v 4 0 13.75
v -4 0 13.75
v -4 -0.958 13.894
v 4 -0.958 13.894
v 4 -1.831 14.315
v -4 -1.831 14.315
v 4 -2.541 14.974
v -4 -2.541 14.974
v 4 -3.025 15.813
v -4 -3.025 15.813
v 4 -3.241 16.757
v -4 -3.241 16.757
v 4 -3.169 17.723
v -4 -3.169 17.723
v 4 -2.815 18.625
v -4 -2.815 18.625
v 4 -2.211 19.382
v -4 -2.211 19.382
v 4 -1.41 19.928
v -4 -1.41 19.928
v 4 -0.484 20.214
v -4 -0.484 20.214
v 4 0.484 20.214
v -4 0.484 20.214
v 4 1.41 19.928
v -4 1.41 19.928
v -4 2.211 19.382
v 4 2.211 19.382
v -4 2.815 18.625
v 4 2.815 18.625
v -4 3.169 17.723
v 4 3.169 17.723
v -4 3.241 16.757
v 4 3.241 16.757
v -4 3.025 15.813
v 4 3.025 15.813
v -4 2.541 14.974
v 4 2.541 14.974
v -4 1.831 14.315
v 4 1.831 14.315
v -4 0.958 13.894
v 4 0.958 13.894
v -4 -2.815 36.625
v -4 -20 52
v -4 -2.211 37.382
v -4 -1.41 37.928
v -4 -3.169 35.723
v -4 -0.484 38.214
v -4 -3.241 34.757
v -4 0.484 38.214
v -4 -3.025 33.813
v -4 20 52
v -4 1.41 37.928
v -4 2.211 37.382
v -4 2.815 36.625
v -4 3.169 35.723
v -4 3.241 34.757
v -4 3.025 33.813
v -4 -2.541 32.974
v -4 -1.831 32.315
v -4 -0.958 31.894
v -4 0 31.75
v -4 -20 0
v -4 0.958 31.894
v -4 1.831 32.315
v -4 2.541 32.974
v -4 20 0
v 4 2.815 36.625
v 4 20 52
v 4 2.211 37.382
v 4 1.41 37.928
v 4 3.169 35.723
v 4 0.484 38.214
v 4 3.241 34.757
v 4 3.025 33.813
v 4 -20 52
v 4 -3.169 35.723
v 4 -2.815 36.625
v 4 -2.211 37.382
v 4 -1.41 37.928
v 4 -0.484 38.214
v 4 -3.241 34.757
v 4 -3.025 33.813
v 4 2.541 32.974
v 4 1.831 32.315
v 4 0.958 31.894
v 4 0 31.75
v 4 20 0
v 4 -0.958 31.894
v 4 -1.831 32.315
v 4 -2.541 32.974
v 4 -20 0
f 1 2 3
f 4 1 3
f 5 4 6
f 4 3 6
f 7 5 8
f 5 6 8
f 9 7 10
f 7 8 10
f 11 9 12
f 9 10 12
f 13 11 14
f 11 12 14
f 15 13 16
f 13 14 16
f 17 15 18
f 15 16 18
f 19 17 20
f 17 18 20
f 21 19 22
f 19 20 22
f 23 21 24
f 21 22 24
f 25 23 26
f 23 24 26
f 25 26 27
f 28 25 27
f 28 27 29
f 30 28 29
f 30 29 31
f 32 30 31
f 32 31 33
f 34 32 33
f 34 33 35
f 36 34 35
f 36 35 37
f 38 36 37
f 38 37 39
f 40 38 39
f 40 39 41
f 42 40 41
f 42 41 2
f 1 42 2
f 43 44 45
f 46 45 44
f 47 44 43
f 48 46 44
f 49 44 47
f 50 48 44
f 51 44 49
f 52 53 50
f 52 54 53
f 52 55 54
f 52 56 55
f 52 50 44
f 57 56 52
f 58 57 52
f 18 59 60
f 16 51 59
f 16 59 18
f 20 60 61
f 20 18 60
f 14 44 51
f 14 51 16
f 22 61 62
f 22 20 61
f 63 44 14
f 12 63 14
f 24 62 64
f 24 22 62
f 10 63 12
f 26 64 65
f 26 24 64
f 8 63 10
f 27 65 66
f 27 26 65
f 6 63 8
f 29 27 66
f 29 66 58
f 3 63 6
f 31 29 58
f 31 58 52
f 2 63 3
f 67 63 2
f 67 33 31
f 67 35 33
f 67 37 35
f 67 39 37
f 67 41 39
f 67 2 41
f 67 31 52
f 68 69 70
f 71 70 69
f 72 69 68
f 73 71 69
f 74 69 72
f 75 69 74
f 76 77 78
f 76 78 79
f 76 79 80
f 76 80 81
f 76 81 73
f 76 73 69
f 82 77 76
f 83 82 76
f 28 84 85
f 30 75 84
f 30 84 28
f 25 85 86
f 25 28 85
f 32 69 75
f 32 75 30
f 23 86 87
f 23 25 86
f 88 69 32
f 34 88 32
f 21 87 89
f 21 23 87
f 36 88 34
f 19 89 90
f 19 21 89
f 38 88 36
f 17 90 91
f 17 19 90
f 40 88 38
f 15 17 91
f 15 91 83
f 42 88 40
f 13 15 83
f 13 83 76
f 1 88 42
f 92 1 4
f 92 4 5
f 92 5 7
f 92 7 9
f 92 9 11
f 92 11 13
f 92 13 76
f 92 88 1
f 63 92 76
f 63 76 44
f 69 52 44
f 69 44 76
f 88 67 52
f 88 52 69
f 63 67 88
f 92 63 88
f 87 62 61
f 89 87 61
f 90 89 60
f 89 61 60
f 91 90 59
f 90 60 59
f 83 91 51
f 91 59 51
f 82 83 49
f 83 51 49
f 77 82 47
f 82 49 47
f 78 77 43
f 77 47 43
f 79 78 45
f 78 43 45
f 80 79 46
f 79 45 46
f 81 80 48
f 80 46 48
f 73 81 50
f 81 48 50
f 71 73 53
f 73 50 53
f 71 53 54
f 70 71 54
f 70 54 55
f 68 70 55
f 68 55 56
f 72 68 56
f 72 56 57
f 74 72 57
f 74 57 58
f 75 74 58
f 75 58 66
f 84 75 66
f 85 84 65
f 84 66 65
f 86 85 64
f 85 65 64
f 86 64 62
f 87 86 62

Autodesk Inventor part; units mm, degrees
ref_plane "YZ Plane" through (0, 0, 0) normal (1, 0, 0) x (0, 1, 0)
ref_plane "Startebene" through (0, 0, 0) normal (0, 0, 1) x (1, 0, 0)
ref_plane "Endebene" through (0, 0, 52) normal (0, 0, 1) x (1, 0, 0)
sketch "Skizze" plane through (0, 0, 0) normal (0, 0, 1) x (1, 0, 0)
  line L0 (4, -20) -> (-4, -20)
  line L1 (-4, -20) -> (-4, 20)
  line L2 (-4, 20) -> (4, 20)
  line L3 (4, 20) -> (4, -20)
  line L4 (-6, 0) -> (8, 0) construction
  line L5 (0, -30) -> (0, 40) construction
  line L6 (0, 54) -> (0, -44) construction
  line L7 (-9.2, 0) -> (13.2, 0) construction
  dimension "d0" = 40
  dimension "d1" = 8
  dimension "d4" = 4
  dimension "d5" = 20
extrude "Körper" add sketch "Skizze" along normal up to surface (52 mm away) from surface at 0
sketch "Sketch3" plane through (0, 0, 0) normal (0, 0, 1) x (1, 0, 0)
  line L0 (0, 0) -> (10, 0)
ref_plane "Work Plane3" through (0, 0, 0) normal (0, -1, 0) x (1, 0, 0)
sketch "Sketch4" plane through (0, 0, 0) normal (0, -1, 0) x (1, 0, 0)
  line L0 (-2, 0) -> (12, 0)
  line L1 (-2, 52) -> (12, 52)
  dimension "d9" = 52
sketch "Skizze5" plane through (4, -20, 52) normal (1, 0, 0) x (0, 0, -1)
  line L0 (0, 40) -> (0, 0) projected
  line L1 (52, 0) -> (0, 0) projected
  line L2 (52, 40) -> (52, 0) projected
  point P0 (52, 20)
  point P1 (17, 20)
  point P2 (35, 20)
  dimension "d10" = 20
  dimension "d11" = 20
  dimension "d12" = 17
  dimension "d13" = 17
hole "Bohrung1" at (4, 0, 35) at (4, 0, 17) direction (-1, 0, 0) diameter 6.5 depth 35 tip angle 118
equation "\"d0\" = G_W"
equation "\"d1\" = G_H"
equation "\"d4\" = 0.5 * d1"
equation "\"d5\" = 0.5 * d0"
equation "\"d2\" = G_L"
equation "\"G_W\" = 40"
equation "\"G_H\" = 8"
equation "\"G_L\" = d9"
equation "\"G_OFFSET_START\" = 0"
equation "\"G_OFFSET_END\" = 0"
equation "\"d7\" = G_OFFSET_END + B_L"
equation "\"B_L\" = 52"
properties part number "EN 10058 - 40 x 6 - 46" material "Stahl, weich"
